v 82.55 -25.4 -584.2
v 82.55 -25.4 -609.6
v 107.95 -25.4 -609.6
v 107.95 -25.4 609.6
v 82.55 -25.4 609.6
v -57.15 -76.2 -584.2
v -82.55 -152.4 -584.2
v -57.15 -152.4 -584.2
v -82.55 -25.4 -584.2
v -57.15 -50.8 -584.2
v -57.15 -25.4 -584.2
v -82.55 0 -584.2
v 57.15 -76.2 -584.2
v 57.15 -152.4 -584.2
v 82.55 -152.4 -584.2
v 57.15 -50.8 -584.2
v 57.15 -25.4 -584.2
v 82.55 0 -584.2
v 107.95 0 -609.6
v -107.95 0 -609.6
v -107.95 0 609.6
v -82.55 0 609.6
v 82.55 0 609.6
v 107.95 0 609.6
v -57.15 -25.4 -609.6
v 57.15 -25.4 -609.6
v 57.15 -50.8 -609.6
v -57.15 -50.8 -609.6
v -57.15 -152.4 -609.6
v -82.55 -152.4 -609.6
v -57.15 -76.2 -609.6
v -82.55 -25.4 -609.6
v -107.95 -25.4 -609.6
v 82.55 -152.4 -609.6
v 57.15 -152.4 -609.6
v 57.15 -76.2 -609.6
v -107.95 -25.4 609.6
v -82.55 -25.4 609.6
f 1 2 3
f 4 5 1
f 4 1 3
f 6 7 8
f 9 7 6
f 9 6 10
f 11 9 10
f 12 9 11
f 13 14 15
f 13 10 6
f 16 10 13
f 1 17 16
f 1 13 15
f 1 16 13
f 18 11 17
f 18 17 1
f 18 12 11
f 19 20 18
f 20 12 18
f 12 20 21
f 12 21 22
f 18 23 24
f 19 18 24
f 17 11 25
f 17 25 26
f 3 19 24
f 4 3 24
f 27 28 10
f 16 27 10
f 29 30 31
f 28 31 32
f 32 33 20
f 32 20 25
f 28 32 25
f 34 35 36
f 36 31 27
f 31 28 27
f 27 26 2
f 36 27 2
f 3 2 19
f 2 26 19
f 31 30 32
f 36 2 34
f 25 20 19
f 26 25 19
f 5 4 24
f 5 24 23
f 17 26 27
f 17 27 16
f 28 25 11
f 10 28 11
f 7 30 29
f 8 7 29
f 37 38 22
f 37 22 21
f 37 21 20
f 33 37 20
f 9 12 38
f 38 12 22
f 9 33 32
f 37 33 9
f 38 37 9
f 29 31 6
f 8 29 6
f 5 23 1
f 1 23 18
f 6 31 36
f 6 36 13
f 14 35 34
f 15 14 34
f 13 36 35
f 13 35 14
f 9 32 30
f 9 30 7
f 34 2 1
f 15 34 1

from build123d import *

# Parameters (mm, degrees)
F1_DEPTH = 25.4
F2_W     = 25.4
F2_H     = 25.4
F3_DEPTH = 127
F4_W     = 25.4
F4_H     = 25.4
F5_DEPTH = 114.3


with BuildPart() as f1:
    # F0 (on Front) → F1 (new body)
    with BuildSketch(Plane.XZ):
        Polygon((107.95, -584.2), (107.95, 609.6), (82.55, 609.6), (82.55, -584.2), (-82.55, -584.2), (-82.55, 609.6), (-107.95, 609.6), (-107.95, -584.2), (-107.95, -609.6), (-82.55, -609.6), (82.55, -609.6), (107.95, -609.6), align=None)
    extrude(amount=F1_DEPTH)

    # F2 (on face) → F3 (join)
    with BuildSketch(Plane.XZ.offset(25.4)):
        with Locations((-69.85, -596.9)):
            Rectangle(F2_W, F2_H)
        with Locations((69.85, -596.9)):
            Rectangle(F2_W, F2_H)
    extrude(amount=F3_DEPTH)

    # F4 (on face) → F5 (join)
    with BuildSketch(Plane.YZ.offset(-57.15)):
        with Locations((-63.5, -596.9)):
            Rectangle(F4_W, F4_H)
    extrude(amount=F5_DEPTH)


solid = f1.part
